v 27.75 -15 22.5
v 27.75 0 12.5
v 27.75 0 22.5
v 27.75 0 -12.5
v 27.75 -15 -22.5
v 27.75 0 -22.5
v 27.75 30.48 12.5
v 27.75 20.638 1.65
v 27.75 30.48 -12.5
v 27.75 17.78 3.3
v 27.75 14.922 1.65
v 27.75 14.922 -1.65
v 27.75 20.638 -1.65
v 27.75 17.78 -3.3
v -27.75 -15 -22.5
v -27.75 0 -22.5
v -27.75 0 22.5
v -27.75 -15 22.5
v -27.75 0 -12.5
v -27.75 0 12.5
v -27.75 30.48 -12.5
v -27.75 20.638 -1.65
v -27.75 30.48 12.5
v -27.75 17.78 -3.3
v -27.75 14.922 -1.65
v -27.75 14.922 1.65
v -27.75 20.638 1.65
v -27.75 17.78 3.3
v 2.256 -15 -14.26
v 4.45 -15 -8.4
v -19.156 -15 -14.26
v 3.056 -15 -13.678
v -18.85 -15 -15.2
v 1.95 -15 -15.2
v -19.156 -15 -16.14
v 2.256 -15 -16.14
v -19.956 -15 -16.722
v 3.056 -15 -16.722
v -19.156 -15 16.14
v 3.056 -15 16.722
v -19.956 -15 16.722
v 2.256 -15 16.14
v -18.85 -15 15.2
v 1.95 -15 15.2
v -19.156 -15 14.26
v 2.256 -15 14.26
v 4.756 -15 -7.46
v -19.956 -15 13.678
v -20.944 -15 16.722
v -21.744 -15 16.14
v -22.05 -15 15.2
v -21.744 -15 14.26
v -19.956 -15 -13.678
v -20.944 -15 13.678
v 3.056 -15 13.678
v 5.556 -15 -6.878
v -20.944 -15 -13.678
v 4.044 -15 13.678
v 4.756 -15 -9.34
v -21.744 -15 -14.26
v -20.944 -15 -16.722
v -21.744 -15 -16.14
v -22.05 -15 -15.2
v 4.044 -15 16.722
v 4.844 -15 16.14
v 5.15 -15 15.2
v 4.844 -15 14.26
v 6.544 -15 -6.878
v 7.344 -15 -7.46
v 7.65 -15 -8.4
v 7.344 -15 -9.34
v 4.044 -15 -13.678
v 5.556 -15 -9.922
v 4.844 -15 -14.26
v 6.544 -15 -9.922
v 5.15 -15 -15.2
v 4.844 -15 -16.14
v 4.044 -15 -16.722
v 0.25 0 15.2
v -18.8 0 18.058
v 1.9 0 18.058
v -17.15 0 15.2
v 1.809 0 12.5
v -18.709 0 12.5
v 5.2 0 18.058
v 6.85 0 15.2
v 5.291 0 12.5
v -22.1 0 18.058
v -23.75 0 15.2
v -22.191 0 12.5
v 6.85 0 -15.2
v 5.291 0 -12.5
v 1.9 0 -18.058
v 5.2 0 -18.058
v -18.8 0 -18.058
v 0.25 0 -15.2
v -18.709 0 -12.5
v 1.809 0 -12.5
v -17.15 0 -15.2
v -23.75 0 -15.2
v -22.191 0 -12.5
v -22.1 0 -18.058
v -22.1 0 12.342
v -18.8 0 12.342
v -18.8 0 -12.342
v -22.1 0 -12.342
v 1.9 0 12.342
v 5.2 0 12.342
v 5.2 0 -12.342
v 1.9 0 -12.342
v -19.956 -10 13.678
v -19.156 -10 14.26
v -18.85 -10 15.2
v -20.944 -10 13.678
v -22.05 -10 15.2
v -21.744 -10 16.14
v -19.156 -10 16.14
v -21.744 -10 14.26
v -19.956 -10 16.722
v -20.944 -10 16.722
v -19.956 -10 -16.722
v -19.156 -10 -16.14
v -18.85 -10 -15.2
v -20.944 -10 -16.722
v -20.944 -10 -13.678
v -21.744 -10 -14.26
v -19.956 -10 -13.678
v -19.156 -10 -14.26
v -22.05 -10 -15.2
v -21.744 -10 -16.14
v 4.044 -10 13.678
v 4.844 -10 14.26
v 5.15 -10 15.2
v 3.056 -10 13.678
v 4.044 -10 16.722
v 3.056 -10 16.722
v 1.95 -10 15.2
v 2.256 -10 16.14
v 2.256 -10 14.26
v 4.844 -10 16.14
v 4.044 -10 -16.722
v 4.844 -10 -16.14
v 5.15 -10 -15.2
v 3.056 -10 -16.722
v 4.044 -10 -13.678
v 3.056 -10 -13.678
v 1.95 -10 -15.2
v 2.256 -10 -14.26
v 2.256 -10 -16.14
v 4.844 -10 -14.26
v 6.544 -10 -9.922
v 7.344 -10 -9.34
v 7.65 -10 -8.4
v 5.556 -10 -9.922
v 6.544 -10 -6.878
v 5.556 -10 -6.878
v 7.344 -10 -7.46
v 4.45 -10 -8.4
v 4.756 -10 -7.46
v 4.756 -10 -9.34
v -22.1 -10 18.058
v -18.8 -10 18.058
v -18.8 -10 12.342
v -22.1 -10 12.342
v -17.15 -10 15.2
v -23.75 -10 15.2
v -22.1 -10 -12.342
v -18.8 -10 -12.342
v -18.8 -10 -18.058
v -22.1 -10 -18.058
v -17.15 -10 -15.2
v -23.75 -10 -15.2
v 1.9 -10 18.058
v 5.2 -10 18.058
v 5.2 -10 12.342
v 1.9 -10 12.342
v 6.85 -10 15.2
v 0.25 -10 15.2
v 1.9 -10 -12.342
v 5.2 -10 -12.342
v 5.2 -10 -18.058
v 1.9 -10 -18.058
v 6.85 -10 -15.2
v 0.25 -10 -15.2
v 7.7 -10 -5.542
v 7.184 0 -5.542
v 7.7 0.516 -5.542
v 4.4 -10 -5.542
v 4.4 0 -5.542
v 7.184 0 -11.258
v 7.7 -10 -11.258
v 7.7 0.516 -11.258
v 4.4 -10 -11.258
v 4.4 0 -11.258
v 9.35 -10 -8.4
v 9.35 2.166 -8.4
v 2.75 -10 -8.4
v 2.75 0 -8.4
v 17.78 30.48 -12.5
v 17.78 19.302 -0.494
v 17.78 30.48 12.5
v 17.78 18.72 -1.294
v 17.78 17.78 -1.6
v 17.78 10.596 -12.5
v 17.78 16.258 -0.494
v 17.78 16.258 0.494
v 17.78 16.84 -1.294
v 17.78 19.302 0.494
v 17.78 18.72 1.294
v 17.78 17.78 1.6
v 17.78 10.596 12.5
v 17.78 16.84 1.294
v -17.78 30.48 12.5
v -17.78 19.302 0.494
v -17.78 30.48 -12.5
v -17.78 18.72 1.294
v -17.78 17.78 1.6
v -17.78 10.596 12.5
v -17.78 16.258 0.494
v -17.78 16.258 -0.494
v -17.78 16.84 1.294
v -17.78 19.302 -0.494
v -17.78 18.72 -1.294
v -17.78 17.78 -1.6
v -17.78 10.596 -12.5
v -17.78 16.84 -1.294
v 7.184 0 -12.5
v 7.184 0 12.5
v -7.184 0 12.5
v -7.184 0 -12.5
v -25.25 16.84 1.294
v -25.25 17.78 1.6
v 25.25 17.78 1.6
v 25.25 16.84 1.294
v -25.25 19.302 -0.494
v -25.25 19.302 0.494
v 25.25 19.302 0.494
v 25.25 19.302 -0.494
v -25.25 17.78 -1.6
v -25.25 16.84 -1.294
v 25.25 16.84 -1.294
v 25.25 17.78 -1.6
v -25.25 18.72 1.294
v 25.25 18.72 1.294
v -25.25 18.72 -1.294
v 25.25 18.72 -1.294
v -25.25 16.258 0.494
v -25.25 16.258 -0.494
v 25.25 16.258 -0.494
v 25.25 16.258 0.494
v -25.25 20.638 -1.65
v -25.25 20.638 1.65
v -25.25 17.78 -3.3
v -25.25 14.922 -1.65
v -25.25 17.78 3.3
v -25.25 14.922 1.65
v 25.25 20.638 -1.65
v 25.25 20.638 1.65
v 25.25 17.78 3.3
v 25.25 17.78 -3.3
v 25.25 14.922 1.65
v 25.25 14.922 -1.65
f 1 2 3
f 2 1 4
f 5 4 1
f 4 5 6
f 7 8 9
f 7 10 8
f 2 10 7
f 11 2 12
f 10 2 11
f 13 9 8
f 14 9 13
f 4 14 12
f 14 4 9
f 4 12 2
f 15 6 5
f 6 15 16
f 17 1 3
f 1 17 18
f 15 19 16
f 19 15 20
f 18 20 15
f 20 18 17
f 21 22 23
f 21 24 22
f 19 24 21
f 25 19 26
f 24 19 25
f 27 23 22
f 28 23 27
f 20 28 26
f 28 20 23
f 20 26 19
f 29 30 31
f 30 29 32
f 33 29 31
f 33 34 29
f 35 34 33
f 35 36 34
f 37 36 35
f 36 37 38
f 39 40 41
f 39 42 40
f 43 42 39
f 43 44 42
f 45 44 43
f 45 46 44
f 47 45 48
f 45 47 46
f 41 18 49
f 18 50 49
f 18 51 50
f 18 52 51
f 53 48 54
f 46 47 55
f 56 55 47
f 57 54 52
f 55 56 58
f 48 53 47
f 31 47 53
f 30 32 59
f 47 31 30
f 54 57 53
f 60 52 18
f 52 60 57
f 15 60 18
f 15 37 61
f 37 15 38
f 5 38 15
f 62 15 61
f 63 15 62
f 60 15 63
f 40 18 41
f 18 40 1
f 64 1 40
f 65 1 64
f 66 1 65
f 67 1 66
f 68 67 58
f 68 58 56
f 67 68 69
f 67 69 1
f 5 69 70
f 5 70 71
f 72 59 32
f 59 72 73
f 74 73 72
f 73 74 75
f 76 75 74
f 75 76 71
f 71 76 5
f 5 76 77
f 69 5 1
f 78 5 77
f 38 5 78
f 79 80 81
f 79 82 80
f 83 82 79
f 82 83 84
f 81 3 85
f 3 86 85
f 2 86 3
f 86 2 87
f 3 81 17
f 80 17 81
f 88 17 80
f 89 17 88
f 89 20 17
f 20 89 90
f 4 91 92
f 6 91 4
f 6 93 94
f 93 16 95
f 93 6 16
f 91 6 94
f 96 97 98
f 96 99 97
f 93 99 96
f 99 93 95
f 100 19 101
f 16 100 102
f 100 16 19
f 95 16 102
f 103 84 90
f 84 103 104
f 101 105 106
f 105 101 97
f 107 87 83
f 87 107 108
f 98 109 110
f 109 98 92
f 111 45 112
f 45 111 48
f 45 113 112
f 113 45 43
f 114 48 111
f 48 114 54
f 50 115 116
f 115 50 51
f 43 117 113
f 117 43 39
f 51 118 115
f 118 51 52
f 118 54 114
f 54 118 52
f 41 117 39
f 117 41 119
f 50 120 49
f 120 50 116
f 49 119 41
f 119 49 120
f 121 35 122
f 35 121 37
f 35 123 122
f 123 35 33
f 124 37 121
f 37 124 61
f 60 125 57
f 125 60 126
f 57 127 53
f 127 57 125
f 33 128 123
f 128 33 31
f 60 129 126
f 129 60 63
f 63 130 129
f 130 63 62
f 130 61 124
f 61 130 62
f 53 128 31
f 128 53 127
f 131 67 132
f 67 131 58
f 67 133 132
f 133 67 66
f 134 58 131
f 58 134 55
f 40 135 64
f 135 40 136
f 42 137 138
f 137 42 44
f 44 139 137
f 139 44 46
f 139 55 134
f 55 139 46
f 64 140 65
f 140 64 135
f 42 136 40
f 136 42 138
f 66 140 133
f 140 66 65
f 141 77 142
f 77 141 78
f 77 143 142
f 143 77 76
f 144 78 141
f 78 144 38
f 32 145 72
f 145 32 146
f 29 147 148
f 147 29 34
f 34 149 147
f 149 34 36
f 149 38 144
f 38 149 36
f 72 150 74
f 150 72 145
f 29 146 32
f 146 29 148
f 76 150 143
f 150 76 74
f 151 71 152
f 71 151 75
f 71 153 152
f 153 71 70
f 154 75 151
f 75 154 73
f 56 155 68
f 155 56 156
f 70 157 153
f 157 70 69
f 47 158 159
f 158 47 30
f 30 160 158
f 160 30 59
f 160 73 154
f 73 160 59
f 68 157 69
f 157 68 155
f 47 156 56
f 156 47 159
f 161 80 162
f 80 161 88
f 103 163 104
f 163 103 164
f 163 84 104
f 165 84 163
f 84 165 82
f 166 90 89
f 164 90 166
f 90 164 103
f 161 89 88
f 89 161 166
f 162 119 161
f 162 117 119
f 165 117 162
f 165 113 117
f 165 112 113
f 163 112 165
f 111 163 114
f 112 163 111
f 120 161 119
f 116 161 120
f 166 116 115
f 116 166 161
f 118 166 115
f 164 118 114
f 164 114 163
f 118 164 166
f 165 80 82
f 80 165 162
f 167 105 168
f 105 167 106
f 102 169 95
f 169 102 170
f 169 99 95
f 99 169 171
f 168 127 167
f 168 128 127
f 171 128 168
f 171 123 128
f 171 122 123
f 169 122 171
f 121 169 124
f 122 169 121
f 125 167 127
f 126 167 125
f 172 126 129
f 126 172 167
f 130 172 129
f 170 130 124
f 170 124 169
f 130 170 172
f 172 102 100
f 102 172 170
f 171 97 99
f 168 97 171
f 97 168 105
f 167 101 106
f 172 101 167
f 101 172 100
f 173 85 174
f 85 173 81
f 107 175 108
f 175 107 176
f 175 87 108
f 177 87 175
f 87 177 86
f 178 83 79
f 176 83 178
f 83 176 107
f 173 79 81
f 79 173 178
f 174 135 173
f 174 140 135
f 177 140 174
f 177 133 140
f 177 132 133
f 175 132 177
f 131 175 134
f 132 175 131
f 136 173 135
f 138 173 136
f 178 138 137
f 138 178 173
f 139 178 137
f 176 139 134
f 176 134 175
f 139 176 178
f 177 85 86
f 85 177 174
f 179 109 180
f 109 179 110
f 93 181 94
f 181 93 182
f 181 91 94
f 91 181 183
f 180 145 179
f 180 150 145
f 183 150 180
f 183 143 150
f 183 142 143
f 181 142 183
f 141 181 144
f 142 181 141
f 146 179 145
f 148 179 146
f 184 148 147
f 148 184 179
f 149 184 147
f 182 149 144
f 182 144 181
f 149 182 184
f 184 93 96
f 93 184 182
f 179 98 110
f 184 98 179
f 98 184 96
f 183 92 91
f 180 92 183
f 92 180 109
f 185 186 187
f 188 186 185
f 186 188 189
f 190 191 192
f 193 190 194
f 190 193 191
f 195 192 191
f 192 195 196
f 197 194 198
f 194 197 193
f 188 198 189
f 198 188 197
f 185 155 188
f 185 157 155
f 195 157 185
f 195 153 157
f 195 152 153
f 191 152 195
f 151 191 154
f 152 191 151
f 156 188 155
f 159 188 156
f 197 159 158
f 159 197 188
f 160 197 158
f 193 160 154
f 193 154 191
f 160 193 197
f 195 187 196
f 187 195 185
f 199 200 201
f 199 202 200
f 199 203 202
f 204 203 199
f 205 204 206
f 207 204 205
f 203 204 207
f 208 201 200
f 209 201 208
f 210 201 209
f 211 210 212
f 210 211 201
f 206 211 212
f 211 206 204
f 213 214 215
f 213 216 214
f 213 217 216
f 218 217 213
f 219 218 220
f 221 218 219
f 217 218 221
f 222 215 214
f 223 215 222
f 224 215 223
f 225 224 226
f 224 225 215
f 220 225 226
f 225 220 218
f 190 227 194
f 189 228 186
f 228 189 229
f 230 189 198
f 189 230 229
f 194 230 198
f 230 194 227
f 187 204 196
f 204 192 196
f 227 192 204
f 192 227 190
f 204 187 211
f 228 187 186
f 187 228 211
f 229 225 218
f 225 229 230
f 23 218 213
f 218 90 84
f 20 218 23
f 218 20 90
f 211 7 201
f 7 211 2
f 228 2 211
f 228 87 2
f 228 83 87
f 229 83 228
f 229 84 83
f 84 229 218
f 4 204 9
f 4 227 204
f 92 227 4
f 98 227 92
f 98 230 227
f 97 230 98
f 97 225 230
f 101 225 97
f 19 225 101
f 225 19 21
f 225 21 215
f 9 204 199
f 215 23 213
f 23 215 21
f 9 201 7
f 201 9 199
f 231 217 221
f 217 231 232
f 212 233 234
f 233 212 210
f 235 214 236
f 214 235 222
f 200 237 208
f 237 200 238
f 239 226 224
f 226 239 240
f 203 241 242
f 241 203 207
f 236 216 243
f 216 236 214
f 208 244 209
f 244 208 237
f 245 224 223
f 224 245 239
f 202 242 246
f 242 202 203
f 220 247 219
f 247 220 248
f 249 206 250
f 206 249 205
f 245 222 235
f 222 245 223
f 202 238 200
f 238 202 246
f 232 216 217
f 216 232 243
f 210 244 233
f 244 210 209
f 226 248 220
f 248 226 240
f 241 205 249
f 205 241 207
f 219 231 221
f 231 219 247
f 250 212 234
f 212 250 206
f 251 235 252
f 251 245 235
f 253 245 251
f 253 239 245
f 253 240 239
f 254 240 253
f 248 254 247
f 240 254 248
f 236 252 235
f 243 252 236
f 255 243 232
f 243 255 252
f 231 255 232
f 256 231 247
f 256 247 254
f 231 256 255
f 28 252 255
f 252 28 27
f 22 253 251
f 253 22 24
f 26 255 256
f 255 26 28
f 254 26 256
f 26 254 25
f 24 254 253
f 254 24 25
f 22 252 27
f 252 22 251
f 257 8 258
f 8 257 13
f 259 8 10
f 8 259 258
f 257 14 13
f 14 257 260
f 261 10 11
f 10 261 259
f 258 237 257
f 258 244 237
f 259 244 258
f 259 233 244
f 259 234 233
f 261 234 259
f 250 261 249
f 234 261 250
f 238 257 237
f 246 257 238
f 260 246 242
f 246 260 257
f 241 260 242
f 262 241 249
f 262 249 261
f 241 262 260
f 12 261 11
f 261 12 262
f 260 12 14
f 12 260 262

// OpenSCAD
// file: ../Parameters.scad
// improving rendering speed.
draft = false;
draft = true;   // comment out for printing.
$fs = draft ? 5 : 0.5;
$fa = 10;

//Main tube diameter - hole [mm]
main_tube_outer_diameter = 25.4;
main_tube_inner_diameter = 23.5;

//Tube for undercarriage - hole [mm]
tube_for_undercarriage_outer_diameter = 10.6;
tube_for_undercarriage_inner_diameter = 6;
global_clearance = 0.5;

//Screw diameter and nut for M4 [mm]
M4_screw_diameter=4.5;
Nut_height_M4 = 3.2;
Nut_diameter_M4 = 7.86;


//Screw diameter and nut for M3 [mm]
M3_screw_diameter = 3.2;
Nut_height_M3 = 1.7;	
Nut_diameter_M3 = 6.6; 


//The tube for help
Help_main_tube_outer = 25;
Help_main_tube_inner = 23; 
Help_tube_for_undercarriage_outer = 10;
Help_tube_for_undercarriage_inner = 5;


//main hull parameters

hull_drop_length = 580;
hull_wall_thickness = 0.8;
hull_y_size = 120;
hull_z_size = 150;
hull_x_size = 580;
hull_corner_radius = 4;
hull_airfoil_thickness= 35;  // thickness of drop generating airfoil in percent of lenght.
hull_scale_x = 1;
hull_scale_y = 1.5;
hull_scale_z = 1.5;

main_pilon_position = 170+68;

//accumulator
//základní rozměry akumulátoru
width_of_accumulator = 129.4;//45+1;
depth_of_accumulator = 40.61;
height_of_accumulator = 43.65;
//Zapuštění akumulátoru
sink_of_accumulator = main_tube_outer_diameter/4 - Nut_height_M3*1.5;
//tloušťka hrany spojky
okraj = 18; 
//posunutí akumálátoru na podložce
move_of_accumulator = 165;

width_of_engine_holder = 63;

//Top Cover Division - dělení horního krytu pro tisk
top_cover_division = [0, 50, 150, 280, 430, hull_x_size]; // upraveny seznam tak, aby deleni začinalo od nuly, což umožňí úplně automatické rozdělení.

////////////////
// Senzory
///////////////////


//opticalFlow
    width_optical_flow_senzor = 45.5;
    depth_optical_flow_senzor = 15;
    height_optical_flow_senzor = 35;
    sink_of_optical_flow_senzor = depth_optical_flow_senzor - 5; 
    M3_optical_flow_senzor_Z = 30.4;
    M3_optical_flow_senzor_X = 24;
    M3_optical_flow_senzor_Z_alone = 9.1;
    M3_optical_flow_senzor_X_alone = 16.7;
// file: lib/naca4.scad
// Naca4.scad - library for parametric airfoils of 4 digit NACA series
// Code: Rudolf Huttary, Berlin 
// June 2015
// commercial use prohibited


// general use: for more examples refer to sampler.scad
// naca = naca digits or 3el vector  (default = 12 or [0, 0, .12])
// L    = chord length [mm]      (default= 100)
// N    = # sample points        (default= 81)
// h    = height [mm]            (default= 1)
// open = close at the thin end? (default = true)
// two equivalent example calls
 airfoil(naca = 2408, L = 60, N=1001, h = 30, open = false); 
// airfoil(naca = [.2, .4, .32], L = 60, N=1001, h = 30, open = false); 

module help()
{
  echo(str("\n\nList of signatures in lib:\n=================\n", 
  "module airfoil(naca=2412, L = 100, N = 81, h = 1, open = false) - renders airfoil object\n", 
  "module airfoil(naca=[.2, .4, .12], L = 100, N = 81, h = 1, open = false) - renders airfoil object using percentage for camber,  camber distance and thicknes\n", 
  "function airfoil_data(naca=12, L = 100, N = 81, open = false)\n",
  "=================\n")); 
}

help(); 
// this is the object
module airfoil(naca=12, L = 100, N = 81, h = 1, open = false)
{
  linear_extrude(height = h)
  polygon(points = airfoil_data(naca, L, N, open)); 
}

// this is the main function providing the airfoil data
function airfoil_data(naca=12, L = 100, N = 81, open = false) = 
  let(Na = len(naca)!=3?NACA(naca):naca)
  let(A = [.2969, -0.126, -.3516, .2843, open?-0.1015:-0.1036])
  [for (b=[-180:360/(N):179.99]) 
    let (x = (1-cos(b))/2)  
    let(yt = sign(b)*Na[2]/.2*(A*[sqrt(x), x, x*x, x*x*x, x*x*x*x])) 
    Na[0]==0?L*[x, yt]:L*camber(x, yt, Na[0], Na[1], sign(b))];  


function trailing_edge_angle(naca=12, open = false) = 
  let(Na = len(naca)!=3?NACA(naca):naca)
  let(A = [.2969, -0.126, -.3516, .2843, open?-0.1015:-0.1036])
  let (x =0.999)  
  let(yt = Na[2]/.2*(A*[sqrt(x), x, x*x, x*x*x, x*x*x*x])) 
  atan2(yt,1-x);  

// helper functions
function NACA(naca) = 
  let (M = floor(naca/1000))
  let (P = floor((naca-M*1000)/100)) 
  [M/100, P/10, floor(naca-M*1000-P*100)/100];  

function camber(x, y, M, P, upper) = 
  let(yc = (x<P)?M/P/P*(2*P*x-x*x): M/(1-P)/(1-P)*(1 - 2*P + 2*P*x -x*x))
  let(dy = (x<P)?2*M/P/P*(P-x):2*M/(1-P)/(1-P)*(P-x))
  let(th = atan(dy))
  [upper ? x - y*sin(th):x + y*sin(th), upper ? yc + y*cos(th):yc - y*cos(th)];
// main file
module 666_1004_mod(){

width_mod = main_tube_outer_diameter + 2*(main_tube_outer_diameter/5);
depth_mod = main_tube_outer_diameter*2 + 2*(main_tube_outer_diameter/5) + main_tube_outer_diameter/10;
height_mod = width_mod;

	difference(){
 
 	translate([-(width_mod/2),- (depth_mod - main_tube_outer_diameter/2 - main_tube_outer_diameter/5),0])
		cube([width_mod,depth_mod,height_mod]);

    //bevelled edge

    translate([width_mod/2+sqrt(2)*(main_tube_outer_diameter/5),0,-3])
    	rotate([0,0,45])
    		cube([width_mod, width_mod,height_mod+6]);
    
    translate([-(width_mod/2)-sqrt(2)*(main_tube_outer_diameter/5),0,-3])
    	rotate([0,0,45])
    		cube([width_mod, width_mod,height_mod+6]); 
    
    translate([-(width_mod/2)-3,- depth_mod + height_mod/2-sqrt(2)*(main_tube_outer_diameter/5),-height_mod+(sqrt(2)*(main_tube_outer_diameter/5))/2])
    	rotate([45,0,0])
    		cube([width_mod+6,height_mod,height_mod]);
   
    translate([-(width_mod/2)-3, -depth_mod + height_mod/2-sqrt(2)*(main_tube_outer_diameter/5),height_mod/2])  
    	rotate([45,0,0])
    		cube([width_mod+6,height_mod,height_mod]);    
	}
}
   



module 888_1003(){

//umístění OpticalFlow senzoru
union(){
   
   translate([-width_optical_flow_senzor/2,0,height_optical_flow_senzor/2])    
   		rotate([180,0,0])
        	
        	//difference placka
        	difference(){    
            	translate([-5,0,-5])
            			cube([width_optical_flow_senzor+10,depth_optical_flow_senzor,10+height_optical_flow_senzor]);
        		
        		//otvory pro šrouby pro připevnění senzoru
        		translate([(height_optical_flow_senzor - M3_optical_flow_senzor_Z)/2,50,(height_optical_flow_senzor - M3_optical_flow_senzor_Z)/2])    
            		rotate([90,0,0])
                		cylinder(h = 80, r1 = M3_screw_diameter/2, r2 = M3_screw_diameter/2, $fn = draft ? 10 : 20);

        		translate([(height_optical_flow_senzor - M3_optical_flow_senzor_Z)/2,50,(height_optical_flow_senzor - M3_optical_flow_senzor_Z)/2 + M3_optical_flow_senzor_Z])    
           			rotate([90,0,0])
                		cylinder(h = 80, r1 = M3_screw_diameter/2, r2 = M3_screw_diameter/2, $fn = draft ? 10 : 20);
        
        		translate([(height_optical_flow_senzor - M3_optical_flow_senzor_Z)/2 + M3_optical_flow_senzor_X,50,(height_optical_flow_senzor - M3_optical_flow_senzor_Z)/2])    
            		rotate([90,0,0])
                		cylinder(h = 80, r1 = M3_screw_diameter/2, r2 = M3_screw_diameter/2, $fn = draft ? 10 : 20);

        		translate([(height_optical_flow_senzor - M3_optical_flow_senzor_Z)/2 + M3_optical_flow_senzor_X,50,(height_optical_flow_senzor - M3_optical_flow_senzor_Z)/2 + M3_optical_flow_senzor_Z])    
            		rotate([90,0,0])
                		cylinder(h = 80, r1 = M3_screw_diameter/2, r2 = M3_screw_diameter/2, $fn = draft ? 10 : 20);

        		translate([width_optical_flow_senzor - M3_optical_flow_senzor_X_alone,50, height_optical_flow_senzor - M3_optical_flow_senzor_Z_alone])
            		rotate([90,0,0])
                		cylinder(h = 80, r1 = M3_screw_diameter/2, r2 = M3_screw_diameter/2, $fn = draft ? 10 : 20);
        
        		//otvory pro matky
        		translate([(height_optical_flow_senzor - M3_optical_flow_senzor_Z)/2,10,(height_optical_flow_senzor - M3_optical_flow_senzor_Z)/2])    
            		rotate([90,0,0])
                		cylinder (h = 40, r1 = Nut_diameter_M3/2, r2 = Nut_diameter_M3/2, $fn = 6);

        		translate([(height_optical_flow_senzor - M3_optical_flow_senzor_Z)/2,10,(height_optical_flow_senzor - M3_optical_flow_senzor_Z)/2 + M3_optical_flow_senzor_Z])    
            		rotate([90,0,0])
                		cylinder (h = 40, r1 = Nut_diameter_M3/2, r2 = Nut_diameter_M3/2, $fn = 6);

        		translate([(height_optical_flow_senzor - M3_optical_flow_senzor_Z)/2 + M3_optical_flow_senzor_X, 10,(height_optical_flow_senzor - M3_optical_flow_senzor_Z)/2])    
            		rotate([90,0,0])
                		cylinder (h = 40, r1 = Nut_diameter_M3/2, r2 = Nut_diameter_M3/2, $fn = 6);

        		translate([(height_optical_flow_senzor - M3_optical_flow_senzor_Z)/2 + M3_optical_flow_senzor_X,10,(height_optical_flow_senzor - M3_optical_flow_senzor_Z)/2 + M3_optical_flow_senzor_Z])    
            		rotate([90,0,0])
                		cylinder (h = 40, r1 = Nut_diameter_M3/2, r2 = Nut_diameter_M3/2, $fn = 6);
       
        		translate([width_optical_flow_senzor - M3_optical_flow_senzor_X_alone,10, height_optical_flow_senzor - M3_optical_flow_senzor_Z_alone])
            		rotate([90,0,0])
                		cylinder (h = 40, r1 = Nut_diameter_M3/2, r2 = Nut_diameter_M3/2, $fn = 6);
		
			//difference
        	}

			//difference pro připevnění k dílu 666_1004
			difference(){
				translate([-width_optical_flow_senzor/2 - 5,0,-12.5])
						cube([width_optical_flow_senzor+10,main_tube_outer_diameter + main_tube_outer_diameter/5,25]);

				translate([0,main_tube_outer_diameter/2 + main_tube_outer_diameter/5,(main_tube_outer_diameter + 2*(main_tube_outer_diameter/5))/2])
					rotate([180,0,0])
						666_1004_mod();

				//otvor pro matku pro připevnění senzoru			
		    	translate([-width_optical_flow_senzor/2 + (width_optical_flow_senzor - M3_optical_flow_senzor_X_alone),30,-(height_optical_flow_senzor/2) + M3_optical_flow_senzor_Z_alone])   
            		rotate([90,0,0])
                		cylinder (h = 40, r1 = Nut_diameter_M3/2, r2 = Nut_diameter_M3/2, $fn = 6);

				//otvor pro šroub pro připevnění placky
				translate([-width_optical_flow_senzor/2 - 15,main_tube_outer_diameter/5 + main_tube_outer_diameter/2,0])	
					rotate([0,90,0])
						cylinder(h = width_optical_flow_senzor + 30, r1 = M3_screw_diameter/2, r2 = M3_screw_diameter/2, $fn = draft ? 10 : 20);
				
				//matka pro připevnění placky
				translate([-width_optical_flow_senzor/2 - 5 - 2.5 - Nut_height_M3,main_tube_outer_diameter/5 + main_tube_outer_diameter/2,0])	
					rotate([0,90,0])	
						cylinder(h = Nut_height_M3 + 5, r1 = Nut_diameter_M3/2, r2 = Nut_diameter_M3/2, $fn = 6);

				translate([width_optical_flow_senzor/2 + 2.5,main_tube_outer_diameter/5 + main_tube_outer_diameter/2,0])	
					rotate([0,90,0])	
						cylinder(h = Nut_height_M3 + 5, r1 = Nut_diameter_M3/2, r2 = Nut_diameter_M3/2, $fn = 6);

			//difference
			}
//union
}
//final module
}


888_1003();


use <./lib/naca4.scad>
include <../Parameters.scad>
